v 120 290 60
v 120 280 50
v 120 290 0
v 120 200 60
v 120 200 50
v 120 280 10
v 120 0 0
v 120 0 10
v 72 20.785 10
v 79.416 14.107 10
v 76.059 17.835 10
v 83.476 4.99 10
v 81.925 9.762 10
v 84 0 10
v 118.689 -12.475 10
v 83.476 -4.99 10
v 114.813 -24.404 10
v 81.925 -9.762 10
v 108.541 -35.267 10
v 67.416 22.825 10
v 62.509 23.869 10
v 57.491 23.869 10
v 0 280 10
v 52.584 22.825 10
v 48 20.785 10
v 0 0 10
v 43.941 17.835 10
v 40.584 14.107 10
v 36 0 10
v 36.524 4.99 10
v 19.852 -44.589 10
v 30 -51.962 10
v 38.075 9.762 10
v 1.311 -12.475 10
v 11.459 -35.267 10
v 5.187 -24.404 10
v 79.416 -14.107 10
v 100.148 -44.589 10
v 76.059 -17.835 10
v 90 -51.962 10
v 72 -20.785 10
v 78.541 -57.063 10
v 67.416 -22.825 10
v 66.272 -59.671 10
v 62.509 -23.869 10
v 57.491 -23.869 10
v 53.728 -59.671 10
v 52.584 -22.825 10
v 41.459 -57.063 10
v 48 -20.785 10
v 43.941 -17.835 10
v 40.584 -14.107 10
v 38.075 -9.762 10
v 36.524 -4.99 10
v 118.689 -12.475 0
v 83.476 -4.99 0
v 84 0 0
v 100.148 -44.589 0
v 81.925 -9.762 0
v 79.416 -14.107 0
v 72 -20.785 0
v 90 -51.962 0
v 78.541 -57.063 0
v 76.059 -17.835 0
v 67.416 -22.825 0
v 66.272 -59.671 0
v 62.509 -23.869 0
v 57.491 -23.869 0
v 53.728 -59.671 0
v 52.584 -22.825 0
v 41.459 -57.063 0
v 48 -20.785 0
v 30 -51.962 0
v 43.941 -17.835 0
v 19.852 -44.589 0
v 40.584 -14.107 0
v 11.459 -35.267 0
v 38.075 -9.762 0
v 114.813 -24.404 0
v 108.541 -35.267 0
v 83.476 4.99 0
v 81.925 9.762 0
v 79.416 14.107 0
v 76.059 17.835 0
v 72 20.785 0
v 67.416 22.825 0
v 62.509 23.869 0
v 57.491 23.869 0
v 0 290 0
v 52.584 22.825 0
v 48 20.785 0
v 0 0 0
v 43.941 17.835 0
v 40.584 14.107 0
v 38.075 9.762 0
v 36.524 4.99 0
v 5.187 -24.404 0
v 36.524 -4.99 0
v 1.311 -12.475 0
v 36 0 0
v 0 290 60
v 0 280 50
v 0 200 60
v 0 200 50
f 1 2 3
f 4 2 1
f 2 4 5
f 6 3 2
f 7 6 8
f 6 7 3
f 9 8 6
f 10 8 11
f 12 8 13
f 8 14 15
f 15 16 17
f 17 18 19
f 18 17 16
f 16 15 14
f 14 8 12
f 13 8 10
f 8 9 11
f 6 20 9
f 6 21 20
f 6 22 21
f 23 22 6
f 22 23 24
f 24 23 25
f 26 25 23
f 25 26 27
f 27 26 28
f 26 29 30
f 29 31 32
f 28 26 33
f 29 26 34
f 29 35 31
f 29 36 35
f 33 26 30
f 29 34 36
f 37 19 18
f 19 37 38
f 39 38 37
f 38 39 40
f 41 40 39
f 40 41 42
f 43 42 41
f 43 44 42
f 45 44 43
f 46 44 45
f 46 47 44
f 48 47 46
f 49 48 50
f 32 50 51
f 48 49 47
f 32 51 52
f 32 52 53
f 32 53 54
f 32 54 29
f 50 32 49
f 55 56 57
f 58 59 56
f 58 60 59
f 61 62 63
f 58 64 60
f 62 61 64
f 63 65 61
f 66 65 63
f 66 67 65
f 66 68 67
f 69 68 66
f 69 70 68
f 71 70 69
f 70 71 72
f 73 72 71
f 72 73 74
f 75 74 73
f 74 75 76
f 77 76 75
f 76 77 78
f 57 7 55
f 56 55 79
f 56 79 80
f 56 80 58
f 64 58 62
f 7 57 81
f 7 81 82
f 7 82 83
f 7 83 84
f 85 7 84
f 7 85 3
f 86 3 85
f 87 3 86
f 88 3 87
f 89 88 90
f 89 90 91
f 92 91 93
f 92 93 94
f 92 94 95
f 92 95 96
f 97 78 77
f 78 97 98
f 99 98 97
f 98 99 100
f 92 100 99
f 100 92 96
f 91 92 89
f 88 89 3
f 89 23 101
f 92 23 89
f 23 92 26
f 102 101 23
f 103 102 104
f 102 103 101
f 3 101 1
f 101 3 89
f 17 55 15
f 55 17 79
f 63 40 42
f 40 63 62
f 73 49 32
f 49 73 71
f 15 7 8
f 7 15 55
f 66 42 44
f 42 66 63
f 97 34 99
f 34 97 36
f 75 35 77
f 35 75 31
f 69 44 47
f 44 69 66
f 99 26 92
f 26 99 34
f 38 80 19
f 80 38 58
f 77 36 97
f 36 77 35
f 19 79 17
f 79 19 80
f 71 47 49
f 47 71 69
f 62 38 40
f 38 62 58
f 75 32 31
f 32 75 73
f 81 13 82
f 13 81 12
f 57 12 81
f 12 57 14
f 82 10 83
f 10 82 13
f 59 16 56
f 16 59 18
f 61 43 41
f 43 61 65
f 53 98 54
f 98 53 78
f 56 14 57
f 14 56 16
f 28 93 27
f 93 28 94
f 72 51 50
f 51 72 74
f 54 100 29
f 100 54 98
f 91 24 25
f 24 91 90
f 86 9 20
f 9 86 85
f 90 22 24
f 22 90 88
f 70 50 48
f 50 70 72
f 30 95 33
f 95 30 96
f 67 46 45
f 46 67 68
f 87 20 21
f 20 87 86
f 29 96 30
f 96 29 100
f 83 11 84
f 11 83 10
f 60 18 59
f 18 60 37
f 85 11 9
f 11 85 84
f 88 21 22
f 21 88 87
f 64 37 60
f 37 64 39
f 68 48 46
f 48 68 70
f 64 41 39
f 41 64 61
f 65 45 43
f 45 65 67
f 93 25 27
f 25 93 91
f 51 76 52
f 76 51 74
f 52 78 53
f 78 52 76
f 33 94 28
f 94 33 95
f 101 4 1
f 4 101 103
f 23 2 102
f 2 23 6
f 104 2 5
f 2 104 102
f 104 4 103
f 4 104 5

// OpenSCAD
Hook_width=120;

Hook_length=290;
Hook_size=90;

module example005()
{



difference(){


union(){
cube([Hook_width,Hook_length,10],false);

translate([Hook_width/2,0,0])
cylinder(10,Hook_width/2,Hook_width/2,false);
}



translate([Hook_width/2,0,0])
cylinder(50,Hook_width/5,Hook_width/5,true);

}

translate([0,Hook_length-10,10])
cube([Hook_width,10,50],false);

translate([0,Hook_length-Hook_size,50])
cube([Hook_width,Hook_size,10],false);

}


example005();
